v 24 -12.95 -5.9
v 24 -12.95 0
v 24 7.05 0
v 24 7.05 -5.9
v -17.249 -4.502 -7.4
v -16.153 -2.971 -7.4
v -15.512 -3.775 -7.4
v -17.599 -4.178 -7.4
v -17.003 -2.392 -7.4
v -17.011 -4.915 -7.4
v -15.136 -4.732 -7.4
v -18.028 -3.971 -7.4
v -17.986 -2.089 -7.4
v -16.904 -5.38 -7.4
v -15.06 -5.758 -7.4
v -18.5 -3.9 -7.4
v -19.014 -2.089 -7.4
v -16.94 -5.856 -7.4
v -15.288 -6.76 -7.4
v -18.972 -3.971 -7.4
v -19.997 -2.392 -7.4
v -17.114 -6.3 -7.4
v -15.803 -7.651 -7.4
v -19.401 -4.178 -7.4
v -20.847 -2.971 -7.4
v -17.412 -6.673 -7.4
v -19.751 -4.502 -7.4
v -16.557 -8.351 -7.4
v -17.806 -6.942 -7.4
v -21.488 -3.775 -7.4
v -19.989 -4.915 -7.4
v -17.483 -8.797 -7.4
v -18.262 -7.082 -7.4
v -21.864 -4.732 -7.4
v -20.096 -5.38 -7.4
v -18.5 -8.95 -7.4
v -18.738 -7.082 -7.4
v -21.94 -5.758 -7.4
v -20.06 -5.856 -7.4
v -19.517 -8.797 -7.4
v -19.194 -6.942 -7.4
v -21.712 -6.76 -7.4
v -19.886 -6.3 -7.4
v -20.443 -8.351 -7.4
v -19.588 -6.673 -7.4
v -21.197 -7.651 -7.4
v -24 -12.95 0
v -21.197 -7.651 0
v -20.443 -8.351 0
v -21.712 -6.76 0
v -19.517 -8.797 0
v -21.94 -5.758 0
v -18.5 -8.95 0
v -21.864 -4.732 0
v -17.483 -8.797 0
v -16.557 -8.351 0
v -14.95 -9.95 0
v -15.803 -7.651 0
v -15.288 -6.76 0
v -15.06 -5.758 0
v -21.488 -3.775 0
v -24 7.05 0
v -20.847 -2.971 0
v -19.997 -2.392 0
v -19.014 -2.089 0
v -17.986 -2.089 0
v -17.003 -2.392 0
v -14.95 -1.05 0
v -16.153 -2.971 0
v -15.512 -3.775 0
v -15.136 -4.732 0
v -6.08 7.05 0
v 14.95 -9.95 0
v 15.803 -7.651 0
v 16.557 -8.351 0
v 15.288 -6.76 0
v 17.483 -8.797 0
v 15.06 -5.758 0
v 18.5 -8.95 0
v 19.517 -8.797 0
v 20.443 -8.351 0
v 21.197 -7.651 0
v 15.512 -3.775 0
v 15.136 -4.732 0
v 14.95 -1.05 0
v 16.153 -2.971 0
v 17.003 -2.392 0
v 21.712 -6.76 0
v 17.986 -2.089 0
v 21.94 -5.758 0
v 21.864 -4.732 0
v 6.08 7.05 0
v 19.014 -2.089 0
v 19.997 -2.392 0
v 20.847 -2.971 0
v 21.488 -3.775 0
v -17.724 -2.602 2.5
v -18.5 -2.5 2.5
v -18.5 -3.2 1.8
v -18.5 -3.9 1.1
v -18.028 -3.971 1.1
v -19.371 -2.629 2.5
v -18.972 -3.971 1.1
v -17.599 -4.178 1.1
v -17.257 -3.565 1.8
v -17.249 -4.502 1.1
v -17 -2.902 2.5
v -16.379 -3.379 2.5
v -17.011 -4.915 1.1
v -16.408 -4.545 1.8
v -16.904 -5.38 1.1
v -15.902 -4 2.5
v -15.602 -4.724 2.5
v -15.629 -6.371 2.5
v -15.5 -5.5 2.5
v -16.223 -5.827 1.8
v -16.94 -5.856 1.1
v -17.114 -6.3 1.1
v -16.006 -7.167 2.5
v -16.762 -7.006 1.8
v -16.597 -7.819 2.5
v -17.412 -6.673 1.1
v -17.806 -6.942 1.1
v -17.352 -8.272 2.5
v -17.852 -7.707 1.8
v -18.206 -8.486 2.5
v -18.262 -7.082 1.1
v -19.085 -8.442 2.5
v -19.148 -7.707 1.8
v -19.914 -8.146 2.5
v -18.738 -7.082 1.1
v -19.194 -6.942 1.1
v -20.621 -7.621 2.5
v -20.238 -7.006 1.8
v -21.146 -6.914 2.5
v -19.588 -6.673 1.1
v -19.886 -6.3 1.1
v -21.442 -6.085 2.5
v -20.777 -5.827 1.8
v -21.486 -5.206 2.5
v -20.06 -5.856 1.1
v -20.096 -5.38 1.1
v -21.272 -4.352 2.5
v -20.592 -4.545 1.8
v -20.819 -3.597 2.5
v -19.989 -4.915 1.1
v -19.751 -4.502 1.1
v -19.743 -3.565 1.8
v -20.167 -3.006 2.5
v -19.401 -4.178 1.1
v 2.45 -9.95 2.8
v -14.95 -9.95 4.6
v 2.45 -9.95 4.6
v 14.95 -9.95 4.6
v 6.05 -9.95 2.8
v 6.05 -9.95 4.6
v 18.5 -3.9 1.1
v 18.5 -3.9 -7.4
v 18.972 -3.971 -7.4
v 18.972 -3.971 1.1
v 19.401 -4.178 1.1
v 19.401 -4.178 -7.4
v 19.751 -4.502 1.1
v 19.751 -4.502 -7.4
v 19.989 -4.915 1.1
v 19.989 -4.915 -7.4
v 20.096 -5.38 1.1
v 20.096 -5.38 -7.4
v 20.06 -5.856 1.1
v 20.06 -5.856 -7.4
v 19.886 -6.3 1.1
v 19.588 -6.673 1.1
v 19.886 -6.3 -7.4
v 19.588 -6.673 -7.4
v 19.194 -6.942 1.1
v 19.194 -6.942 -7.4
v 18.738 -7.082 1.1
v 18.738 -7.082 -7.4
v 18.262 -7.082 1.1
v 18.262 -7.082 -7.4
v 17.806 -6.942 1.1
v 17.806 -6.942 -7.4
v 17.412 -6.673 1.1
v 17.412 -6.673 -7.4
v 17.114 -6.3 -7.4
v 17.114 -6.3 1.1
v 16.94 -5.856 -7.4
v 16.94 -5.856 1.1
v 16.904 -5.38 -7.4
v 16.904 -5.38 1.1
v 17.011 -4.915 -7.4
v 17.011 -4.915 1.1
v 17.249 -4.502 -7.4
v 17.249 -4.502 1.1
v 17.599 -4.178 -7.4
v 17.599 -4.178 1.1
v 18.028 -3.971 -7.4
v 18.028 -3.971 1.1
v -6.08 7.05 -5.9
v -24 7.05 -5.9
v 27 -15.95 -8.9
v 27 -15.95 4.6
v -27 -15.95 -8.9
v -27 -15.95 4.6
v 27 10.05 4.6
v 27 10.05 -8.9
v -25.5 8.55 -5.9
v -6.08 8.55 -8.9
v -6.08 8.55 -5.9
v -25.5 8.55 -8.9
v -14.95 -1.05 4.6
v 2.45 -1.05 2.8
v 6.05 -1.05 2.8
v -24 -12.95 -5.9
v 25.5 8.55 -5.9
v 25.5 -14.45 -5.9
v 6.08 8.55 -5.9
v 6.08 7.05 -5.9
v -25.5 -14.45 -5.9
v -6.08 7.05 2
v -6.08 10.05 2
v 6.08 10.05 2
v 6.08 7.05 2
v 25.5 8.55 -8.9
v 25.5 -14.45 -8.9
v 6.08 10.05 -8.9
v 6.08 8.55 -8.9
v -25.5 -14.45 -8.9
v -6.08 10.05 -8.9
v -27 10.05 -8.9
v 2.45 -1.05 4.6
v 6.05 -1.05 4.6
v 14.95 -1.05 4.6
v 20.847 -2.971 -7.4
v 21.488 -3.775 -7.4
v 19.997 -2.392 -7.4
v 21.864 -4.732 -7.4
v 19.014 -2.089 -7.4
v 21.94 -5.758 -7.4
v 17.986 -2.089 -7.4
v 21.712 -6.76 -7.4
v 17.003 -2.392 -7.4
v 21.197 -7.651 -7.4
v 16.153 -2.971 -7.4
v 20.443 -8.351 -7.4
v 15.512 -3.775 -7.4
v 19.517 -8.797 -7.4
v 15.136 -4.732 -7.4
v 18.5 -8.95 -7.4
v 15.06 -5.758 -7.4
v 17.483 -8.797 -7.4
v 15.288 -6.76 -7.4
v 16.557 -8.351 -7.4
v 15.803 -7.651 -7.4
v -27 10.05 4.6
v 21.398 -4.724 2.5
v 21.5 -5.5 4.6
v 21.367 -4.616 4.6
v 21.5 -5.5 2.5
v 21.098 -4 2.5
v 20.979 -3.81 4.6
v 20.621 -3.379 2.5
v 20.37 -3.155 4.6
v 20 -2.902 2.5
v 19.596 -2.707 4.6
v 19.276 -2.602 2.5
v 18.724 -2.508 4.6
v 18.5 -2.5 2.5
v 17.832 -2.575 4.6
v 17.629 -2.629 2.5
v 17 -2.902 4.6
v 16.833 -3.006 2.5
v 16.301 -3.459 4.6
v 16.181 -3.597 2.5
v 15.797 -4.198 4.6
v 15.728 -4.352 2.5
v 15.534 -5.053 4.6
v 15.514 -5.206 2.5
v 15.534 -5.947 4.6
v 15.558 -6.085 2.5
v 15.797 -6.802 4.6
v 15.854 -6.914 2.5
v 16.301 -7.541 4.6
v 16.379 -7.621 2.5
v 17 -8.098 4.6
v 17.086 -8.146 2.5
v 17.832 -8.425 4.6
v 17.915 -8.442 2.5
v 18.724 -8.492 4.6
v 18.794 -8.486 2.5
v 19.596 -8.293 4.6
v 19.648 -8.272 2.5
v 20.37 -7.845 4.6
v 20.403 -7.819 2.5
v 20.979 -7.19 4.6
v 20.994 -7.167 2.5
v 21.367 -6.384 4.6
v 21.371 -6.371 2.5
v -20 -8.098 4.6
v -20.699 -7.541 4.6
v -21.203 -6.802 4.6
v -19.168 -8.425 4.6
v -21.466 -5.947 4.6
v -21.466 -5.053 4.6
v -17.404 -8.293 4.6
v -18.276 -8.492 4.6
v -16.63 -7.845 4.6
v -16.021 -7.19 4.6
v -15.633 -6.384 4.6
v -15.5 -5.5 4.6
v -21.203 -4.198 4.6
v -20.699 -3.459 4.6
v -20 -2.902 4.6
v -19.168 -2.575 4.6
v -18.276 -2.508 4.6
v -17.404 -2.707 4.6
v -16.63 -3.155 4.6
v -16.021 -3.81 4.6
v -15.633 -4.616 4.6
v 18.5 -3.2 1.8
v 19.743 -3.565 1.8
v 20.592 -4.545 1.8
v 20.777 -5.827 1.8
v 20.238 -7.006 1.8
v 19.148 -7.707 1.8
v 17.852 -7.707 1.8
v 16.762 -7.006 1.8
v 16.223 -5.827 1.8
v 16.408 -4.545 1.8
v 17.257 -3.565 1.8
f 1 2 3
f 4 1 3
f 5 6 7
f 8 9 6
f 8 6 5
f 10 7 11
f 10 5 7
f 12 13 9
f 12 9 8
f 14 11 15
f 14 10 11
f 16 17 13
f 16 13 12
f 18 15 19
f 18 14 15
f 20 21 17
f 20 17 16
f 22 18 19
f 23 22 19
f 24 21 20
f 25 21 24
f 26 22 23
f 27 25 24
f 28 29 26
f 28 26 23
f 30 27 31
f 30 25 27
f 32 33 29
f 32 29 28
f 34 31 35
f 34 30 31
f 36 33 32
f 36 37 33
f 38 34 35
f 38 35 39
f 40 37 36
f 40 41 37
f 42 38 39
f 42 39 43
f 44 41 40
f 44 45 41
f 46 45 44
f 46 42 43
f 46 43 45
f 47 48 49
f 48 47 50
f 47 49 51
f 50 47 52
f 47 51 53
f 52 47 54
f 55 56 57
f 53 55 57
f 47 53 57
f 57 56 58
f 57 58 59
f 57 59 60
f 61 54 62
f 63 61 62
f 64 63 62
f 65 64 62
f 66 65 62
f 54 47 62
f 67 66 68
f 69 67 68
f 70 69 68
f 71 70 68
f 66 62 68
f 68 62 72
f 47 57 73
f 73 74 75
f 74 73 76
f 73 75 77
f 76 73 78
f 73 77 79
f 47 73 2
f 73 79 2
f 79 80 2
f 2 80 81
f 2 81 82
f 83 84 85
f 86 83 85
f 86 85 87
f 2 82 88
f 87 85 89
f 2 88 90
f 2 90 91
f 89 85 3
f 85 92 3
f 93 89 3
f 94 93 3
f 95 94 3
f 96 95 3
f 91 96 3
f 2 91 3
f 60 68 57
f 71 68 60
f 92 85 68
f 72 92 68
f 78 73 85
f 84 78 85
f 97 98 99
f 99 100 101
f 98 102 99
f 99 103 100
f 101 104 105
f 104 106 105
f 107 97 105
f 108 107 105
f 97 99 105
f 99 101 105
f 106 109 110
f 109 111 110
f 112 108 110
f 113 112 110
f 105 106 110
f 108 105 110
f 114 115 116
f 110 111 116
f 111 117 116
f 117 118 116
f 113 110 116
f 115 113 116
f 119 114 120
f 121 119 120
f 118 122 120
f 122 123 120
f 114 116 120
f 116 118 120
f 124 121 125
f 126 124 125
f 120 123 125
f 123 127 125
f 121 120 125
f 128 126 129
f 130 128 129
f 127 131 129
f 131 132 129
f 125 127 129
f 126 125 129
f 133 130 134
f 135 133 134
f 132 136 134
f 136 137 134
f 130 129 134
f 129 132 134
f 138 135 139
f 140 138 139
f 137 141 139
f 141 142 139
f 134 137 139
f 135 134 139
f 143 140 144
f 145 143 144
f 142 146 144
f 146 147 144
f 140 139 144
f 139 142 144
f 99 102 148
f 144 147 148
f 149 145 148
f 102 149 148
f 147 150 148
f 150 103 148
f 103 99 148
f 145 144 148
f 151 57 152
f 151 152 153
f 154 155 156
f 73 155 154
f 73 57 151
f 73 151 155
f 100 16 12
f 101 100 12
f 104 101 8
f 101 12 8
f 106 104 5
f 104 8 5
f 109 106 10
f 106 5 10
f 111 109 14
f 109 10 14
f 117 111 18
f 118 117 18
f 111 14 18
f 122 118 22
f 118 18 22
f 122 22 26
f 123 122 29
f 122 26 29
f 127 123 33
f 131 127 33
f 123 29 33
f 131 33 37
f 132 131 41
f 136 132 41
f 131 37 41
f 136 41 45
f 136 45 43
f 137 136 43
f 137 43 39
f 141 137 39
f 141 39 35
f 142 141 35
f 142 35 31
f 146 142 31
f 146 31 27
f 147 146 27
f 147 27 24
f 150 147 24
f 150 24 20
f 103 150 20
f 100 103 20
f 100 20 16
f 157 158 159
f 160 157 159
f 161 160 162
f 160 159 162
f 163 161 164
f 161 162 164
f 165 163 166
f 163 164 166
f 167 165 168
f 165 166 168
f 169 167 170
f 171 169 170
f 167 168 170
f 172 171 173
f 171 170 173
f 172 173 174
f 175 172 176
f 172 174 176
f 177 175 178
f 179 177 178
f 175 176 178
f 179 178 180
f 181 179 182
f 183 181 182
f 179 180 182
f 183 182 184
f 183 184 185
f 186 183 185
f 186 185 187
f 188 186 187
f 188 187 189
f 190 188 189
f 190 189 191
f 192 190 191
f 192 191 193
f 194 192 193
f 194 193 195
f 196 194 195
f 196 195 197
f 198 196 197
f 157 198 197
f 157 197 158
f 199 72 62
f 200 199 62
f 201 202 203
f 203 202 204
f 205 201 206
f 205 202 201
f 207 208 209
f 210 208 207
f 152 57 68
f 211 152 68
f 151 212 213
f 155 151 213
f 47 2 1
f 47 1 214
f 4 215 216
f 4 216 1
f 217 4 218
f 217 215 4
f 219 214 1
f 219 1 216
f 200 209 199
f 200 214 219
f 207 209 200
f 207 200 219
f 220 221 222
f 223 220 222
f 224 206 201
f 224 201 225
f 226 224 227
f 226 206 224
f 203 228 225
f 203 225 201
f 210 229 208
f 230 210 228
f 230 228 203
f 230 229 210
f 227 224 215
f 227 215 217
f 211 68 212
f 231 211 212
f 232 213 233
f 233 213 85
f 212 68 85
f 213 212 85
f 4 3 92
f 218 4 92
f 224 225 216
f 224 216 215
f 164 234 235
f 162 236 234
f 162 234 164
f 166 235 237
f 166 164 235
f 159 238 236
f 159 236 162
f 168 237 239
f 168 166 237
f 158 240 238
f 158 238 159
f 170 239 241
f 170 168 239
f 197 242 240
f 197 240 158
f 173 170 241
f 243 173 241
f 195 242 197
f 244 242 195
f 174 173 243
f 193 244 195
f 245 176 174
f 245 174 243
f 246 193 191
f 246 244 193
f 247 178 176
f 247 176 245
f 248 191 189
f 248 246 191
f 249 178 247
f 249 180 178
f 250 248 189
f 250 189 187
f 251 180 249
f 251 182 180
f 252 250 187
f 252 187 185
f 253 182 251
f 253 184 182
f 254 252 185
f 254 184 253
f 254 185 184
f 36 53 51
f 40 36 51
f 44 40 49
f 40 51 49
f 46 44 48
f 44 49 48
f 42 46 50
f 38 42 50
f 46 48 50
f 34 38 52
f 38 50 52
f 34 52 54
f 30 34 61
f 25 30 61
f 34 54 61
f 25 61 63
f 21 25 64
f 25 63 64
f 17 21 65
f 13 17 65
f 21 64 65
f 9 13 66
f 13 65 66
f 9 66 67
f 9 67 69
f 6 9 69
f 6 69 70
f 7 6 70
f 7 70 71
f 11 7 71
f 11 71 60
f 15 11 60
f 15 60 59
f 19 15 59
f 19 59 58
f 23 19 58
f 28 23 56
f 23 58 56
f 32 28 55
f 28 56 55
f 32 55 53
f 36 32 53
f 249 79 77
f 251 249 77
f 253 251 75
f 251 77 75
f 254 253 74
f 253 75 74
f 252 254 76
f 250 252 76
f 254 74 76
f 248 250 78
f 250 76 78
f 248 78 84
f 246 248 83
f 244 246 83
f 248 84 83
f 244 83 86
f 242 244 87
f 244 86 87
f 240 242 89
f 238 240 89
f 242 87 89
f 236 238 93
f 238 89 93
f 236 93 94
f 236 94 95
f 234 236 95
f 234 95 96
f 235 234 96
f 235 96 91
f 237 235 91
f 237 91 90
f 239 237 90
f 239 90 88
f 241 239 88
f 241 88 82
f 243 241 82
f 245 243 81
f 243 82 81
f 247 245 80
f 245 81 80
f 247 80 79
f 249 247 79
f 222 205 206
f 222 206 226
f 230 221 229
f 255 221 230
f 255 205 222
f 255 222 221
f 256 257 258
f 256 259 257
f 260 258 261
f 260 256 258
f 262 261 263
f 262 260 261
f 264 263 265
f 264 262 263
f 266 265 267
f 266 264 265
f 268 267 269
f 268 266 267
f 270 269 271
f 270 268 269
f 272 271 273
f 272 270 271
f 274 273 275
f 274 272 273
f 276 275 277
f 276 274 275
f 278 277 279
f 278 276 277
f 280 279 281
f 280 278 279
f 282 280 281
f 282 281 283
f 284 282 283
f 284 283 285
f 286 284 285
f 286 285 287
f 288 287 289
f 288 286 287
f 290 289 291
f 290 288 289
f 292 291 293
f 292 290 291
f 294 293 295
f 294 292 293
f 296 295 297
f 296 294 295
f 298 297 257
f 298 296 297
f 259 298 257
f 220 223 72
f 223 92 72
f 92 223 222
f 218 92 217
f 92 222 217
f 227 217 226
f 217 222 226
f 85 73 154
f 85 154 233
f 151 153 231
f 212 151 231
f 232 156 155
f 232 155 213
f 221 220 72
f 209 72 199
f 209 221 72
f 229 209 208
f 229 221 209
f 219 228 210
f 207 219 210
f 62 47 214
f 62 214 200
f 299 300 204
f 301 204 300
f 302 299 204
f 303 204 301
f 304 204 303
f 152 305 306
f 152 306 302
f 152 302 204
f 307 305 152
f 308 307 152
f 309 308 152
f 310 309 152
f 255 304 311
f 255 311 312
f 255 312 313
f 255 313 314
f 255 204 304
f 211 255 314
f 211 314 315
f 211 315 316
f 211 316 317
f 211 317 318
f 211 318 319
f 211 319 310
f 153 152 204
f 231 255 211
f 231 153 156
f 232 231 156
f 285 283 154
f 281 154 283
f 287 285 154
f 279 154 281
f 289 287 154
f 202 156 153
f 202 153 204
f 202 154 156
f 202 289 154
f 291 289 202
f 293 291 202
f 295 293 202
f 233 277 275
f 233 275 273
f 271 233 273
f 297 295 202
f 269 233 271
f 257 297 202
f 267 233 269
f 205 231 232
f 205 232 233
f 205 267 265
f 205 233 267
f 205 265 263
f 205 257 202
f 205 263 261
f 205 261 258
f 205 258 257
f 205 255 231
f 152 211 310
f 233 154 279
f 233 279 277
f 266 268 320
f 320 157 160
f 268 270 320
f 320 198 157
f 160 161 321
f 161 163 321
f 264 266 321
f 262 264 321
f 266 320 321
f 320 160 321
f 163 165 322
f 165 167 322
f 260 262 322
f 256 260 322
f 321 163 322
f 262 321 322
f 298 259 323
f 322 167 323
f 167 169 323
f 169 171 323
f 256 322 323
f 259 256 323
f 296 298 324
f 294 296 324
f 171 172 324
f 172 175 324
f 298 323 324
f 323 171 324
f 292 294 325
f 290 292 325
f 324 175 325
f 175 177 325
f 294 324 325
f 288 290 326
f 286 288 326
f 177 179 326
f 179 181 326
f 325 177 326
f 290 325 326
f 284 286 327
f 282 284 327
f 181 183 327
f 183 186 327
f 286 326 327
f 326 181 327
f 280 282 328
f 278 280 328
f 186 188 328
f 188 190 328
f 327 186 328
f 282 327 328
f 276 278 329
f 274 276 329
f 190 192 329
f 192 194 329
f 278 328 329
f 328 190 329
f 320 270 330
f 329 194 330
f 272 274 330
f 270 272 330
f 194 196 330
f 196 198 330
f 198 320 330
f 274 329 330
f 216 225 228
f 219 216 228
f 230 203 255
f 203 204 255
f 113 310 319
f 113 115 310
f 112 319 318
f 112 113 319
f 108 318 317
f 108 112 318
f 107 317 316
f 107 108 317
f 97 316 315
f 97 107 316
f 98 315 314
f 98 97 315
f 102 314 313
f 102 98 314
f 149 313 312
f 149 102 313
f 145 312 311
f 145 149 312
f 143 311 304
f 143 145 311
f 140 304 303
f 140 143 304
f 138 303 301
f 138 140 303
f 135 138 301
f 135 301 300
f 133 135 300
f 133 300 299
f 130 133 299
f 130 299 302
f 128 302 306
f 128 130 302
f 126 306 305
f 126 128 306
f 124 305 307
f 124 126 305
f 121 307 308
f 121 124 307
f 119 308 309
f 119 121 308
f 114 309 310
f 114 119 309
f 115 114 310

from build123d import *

# Parameters (mm, degrees)
SKETCH1_W           = 54
SKETCH1_H           = 26
SKETCH1_W_2         = 29.9
SKETCH1_H_2         = 8.9
BOSS_EXTRUDE1_DEPTH = 4.6
SKETCH2_W           = 3.6
SKETCH2_H           = 8.9
BOSS_EXTRUDE2_DEPTH = 1.8
SKETCH3_R           = 3.45
BOSS_EXTRUDE3_DEPTH = 7.4
SKETCH4_W           = 54
SKETCH4_H           = 26
SKETCH4_W_2         = 48
SKETCH4_H_2         = 20
BOSS_EXTRUDE4_DEPTH = 8.9
SKETCH5_W           = 51
SKETCH5_H           = 23
SKETCH5_W_2         = 48
SKETCH5_H_2         = 20
CUT_EXTRUDE1_DEPTH  = 3
SKETCH6_R           = 1.6
CUT_EXTRUDE2_DEPTH  = 12
CUT_EXTRUDE3_REACH  = 40.525
SKETCH7_W           = 12.16
SKETCH7_H           = 10.9
SKETCH8_R           = 3
CUT_EXTRUDE4_DEPTH  = 34.401384702
CHAMFER1_SIZE       = 1.5


with BuildPart() as part:
    # Sketch1 → Boss-Extrude1 (new body)
    with BuildSketch(Plane.XY):
        with Locations((0, -2.95)):
            Rectangle(SKETCH1_W, SKETCH1_H)
        with Locations((0, -5.5)):
            Rectangle(SKETCH1_W_2, SKETCH1_H_2, mode=Mode.SUBTRACT)
    extrude(amount=BOSS_EXTRUDE1_DEPTH)

    # Sketch2 → Boss-Extrude2 (add)
    with BuildSketch(Plane.XY.offset(4.6)):
        with Locations((4.25, -5.5)):
            Rectangle(SKETCH2_W, SKETCH2_H)
    extrude(amount=-BOSS_EXTRUDE2_DEPTH)

    # Sketch3 → Boss-Extrude3 (add)
    with BuildSketch(Plane(origin=(0, 0, 0), x_dir=(-1, 0, 0), z_dir=(0, 0, -1))):
        with Locations(Location((-18.5, -5.5, 0), (0, 0, 270))):
            Circle(SKETCH3_R)
        with Locations(Location((18.5, -5.5, 0), (0, 0, 270))):
            Circle(SKETCH3_R)
    extrude(amount=BOSS_EXTRUDE3_DEPTH)

    # Sketch4 → Boss-Extrude4 (add)
    with BuildSketch(Plane(origin=(0, 0, 0), x_dir=(-1, 0, 0), z_dir=(0, 0, -1))):
        with Locations((0, -2.95)):
            Rectangle(SKETCH4_W, SKETCH4_H)
        with Locations((0, -2.95)):
            Rectangle(SKETCH4_W_2, SKETCH4_H_2, mode=Mode.SUBTRACT)
    extrude(amount=BOSS_EXTRUDE4_DEPTH)

    # Sketch5 → Cut-Extrude1 (cut)
    with BuildSketch(Plane(origin=(0, 0, -8.9), x_dir=(-1, 0, 0), z_dir=(0, 0, -1))):
        with Locations((0, -2.95)):
            Rectangle(SKETCH5_W, SKETCH5_H)
        with Locations((0, -2.95)):
            Rectangle(SKETCH5_W_2, SKETCH5_H_2, mode=Mode.SUBTRACT)
    extrude(amount=-CUT_EXTRUDE1_DEPTH, mode=Mode.SUBTRACT)

    # Sketch6 → Cut-Extrude2 (cut)
    with BuildSketch(Plane(origin=(0, 0, -7.4), x_dir=(-1, 0, 0), z_dir=(0, 0, -1))):
        with Locations(Location((-18.5, -5.5, 0), (0, 0, 90))):
            Circle(SKETCH6_R)
        with Locations(Location((18.5, -5.5, 0), (0, 0, 90))):
            Circle(SKETCH6_R)
    extrude(amount=-CUT_EXTRUDE2_DEPTH, mode=Mode.SUBTRACT)

    # Cut-Extrude3: up to this face of the body (flat: up to its plane)
    cut_extrude3_end = Plane(part.part.faces().sort_by_distance((0, 7.05, -2.95))[0])
    # Sketch7 → Cut-Extrude3 (cut, up to the picked face)
    with BuildSketch(Plane(origin=(0, 10.05, 0), x_dir=(1, 0, 0), z_dir=(0, 1, 0)), mode=Mode.PRIVATE) as cut_extrude3_sk1:
        with Locations((0, 3.45)):
            Rectangle(SKETCH7_W, SKETCH7_H)
    cut_extrude3_tool1 = split(extrude(cut_extrude3_sk1.sketch, amount=-CUT_EXTRUDE3_REACH, mode=Mode.PRIVATE), bisect_by=cut_extrude3_end, keep=Keep.BOTH, mode=Mode.PRIVATE)
    add(cut_extrude3_tool1.solids().sort_by(Axis((0, 10.05, -3.45), (0, -1, 0)))[0], mode=Mode.SUBTRACT)

    # Sketch8 → Cut-Extrude4 (cut, through all)
    with BuildSketch(Plane.XY.offset(2.6)):
        with Locations((-18.5, -5.5)):
            Circle(SKETCH8_R)
        with Locations((18.5, -5.5)):
            Circle(SKETCH8_R)
    extrude(amount=CUT_EXTRUDE4_DEPTH, mode=Mode.SUBTRACT)

    # Chamfer1
    # the kernel refuses this chamfer: 1.5 mm, written as the material it takes off along each edge
    with BuildSketch(Plane(origin=(-18.5, -5.5, 2.6), x_dir=(0, 1, 0), z_dir=(-1, 0, 0))) as chamfer1_piece_1_section:
        Polygon((1.6 + CHAMFER1_SIZE, 0), (1.6, CHAMFER1_SIZE), (1.6, 0), align=None)
    chamfer1_piece_1 = revolve(axis=Axis((-18.5, -5.5, 2.6), (0, 0, -1)), mode=Mode.PRIVATE)
    chamfer1_piece_1 = chamfer1_piece_1 & Plane(origin=(-18.5, -5.5, 1.79661682), x_dir=(1, 0, 0), z_dir=(0, 0, -1)) * Cylinder(3, 13, mode=Mode.PRIVATE)
    add(chamfer1_piece_1, mode=Mode.SUBTRACT)
    with BuildSketch(Plane(origin=(18.5, -5.5, 2.6), x_dir=(0, 1, 0), z_dir=(-1, 0, 0))) as chamfer1_piece_2_section:
        Polygon((1.6 + CHAMFER1_SIZE, 0), (1.6, CHAMFER1_SIZE), (1.6, 0), align=None)
    chamfer1_piece_2 = revolve(axis=Axis((18.5, -5.5, 2.6), (0, 0, -1)), mode=Mode.PRIVATE)
    chamfer1_piece_2 = chamfer1_piece_2 & Plane(origin=(18.5, -5.5, 1.79661682), x_dir=(1, 0, 0), z_dir=(0, 0, -1)) * Cylinder(3, 13, mode=Mode.PRIVATE)
    add(chamfer1_piece_2, mode=Mode.SUBTRACT)


solid = part.part
